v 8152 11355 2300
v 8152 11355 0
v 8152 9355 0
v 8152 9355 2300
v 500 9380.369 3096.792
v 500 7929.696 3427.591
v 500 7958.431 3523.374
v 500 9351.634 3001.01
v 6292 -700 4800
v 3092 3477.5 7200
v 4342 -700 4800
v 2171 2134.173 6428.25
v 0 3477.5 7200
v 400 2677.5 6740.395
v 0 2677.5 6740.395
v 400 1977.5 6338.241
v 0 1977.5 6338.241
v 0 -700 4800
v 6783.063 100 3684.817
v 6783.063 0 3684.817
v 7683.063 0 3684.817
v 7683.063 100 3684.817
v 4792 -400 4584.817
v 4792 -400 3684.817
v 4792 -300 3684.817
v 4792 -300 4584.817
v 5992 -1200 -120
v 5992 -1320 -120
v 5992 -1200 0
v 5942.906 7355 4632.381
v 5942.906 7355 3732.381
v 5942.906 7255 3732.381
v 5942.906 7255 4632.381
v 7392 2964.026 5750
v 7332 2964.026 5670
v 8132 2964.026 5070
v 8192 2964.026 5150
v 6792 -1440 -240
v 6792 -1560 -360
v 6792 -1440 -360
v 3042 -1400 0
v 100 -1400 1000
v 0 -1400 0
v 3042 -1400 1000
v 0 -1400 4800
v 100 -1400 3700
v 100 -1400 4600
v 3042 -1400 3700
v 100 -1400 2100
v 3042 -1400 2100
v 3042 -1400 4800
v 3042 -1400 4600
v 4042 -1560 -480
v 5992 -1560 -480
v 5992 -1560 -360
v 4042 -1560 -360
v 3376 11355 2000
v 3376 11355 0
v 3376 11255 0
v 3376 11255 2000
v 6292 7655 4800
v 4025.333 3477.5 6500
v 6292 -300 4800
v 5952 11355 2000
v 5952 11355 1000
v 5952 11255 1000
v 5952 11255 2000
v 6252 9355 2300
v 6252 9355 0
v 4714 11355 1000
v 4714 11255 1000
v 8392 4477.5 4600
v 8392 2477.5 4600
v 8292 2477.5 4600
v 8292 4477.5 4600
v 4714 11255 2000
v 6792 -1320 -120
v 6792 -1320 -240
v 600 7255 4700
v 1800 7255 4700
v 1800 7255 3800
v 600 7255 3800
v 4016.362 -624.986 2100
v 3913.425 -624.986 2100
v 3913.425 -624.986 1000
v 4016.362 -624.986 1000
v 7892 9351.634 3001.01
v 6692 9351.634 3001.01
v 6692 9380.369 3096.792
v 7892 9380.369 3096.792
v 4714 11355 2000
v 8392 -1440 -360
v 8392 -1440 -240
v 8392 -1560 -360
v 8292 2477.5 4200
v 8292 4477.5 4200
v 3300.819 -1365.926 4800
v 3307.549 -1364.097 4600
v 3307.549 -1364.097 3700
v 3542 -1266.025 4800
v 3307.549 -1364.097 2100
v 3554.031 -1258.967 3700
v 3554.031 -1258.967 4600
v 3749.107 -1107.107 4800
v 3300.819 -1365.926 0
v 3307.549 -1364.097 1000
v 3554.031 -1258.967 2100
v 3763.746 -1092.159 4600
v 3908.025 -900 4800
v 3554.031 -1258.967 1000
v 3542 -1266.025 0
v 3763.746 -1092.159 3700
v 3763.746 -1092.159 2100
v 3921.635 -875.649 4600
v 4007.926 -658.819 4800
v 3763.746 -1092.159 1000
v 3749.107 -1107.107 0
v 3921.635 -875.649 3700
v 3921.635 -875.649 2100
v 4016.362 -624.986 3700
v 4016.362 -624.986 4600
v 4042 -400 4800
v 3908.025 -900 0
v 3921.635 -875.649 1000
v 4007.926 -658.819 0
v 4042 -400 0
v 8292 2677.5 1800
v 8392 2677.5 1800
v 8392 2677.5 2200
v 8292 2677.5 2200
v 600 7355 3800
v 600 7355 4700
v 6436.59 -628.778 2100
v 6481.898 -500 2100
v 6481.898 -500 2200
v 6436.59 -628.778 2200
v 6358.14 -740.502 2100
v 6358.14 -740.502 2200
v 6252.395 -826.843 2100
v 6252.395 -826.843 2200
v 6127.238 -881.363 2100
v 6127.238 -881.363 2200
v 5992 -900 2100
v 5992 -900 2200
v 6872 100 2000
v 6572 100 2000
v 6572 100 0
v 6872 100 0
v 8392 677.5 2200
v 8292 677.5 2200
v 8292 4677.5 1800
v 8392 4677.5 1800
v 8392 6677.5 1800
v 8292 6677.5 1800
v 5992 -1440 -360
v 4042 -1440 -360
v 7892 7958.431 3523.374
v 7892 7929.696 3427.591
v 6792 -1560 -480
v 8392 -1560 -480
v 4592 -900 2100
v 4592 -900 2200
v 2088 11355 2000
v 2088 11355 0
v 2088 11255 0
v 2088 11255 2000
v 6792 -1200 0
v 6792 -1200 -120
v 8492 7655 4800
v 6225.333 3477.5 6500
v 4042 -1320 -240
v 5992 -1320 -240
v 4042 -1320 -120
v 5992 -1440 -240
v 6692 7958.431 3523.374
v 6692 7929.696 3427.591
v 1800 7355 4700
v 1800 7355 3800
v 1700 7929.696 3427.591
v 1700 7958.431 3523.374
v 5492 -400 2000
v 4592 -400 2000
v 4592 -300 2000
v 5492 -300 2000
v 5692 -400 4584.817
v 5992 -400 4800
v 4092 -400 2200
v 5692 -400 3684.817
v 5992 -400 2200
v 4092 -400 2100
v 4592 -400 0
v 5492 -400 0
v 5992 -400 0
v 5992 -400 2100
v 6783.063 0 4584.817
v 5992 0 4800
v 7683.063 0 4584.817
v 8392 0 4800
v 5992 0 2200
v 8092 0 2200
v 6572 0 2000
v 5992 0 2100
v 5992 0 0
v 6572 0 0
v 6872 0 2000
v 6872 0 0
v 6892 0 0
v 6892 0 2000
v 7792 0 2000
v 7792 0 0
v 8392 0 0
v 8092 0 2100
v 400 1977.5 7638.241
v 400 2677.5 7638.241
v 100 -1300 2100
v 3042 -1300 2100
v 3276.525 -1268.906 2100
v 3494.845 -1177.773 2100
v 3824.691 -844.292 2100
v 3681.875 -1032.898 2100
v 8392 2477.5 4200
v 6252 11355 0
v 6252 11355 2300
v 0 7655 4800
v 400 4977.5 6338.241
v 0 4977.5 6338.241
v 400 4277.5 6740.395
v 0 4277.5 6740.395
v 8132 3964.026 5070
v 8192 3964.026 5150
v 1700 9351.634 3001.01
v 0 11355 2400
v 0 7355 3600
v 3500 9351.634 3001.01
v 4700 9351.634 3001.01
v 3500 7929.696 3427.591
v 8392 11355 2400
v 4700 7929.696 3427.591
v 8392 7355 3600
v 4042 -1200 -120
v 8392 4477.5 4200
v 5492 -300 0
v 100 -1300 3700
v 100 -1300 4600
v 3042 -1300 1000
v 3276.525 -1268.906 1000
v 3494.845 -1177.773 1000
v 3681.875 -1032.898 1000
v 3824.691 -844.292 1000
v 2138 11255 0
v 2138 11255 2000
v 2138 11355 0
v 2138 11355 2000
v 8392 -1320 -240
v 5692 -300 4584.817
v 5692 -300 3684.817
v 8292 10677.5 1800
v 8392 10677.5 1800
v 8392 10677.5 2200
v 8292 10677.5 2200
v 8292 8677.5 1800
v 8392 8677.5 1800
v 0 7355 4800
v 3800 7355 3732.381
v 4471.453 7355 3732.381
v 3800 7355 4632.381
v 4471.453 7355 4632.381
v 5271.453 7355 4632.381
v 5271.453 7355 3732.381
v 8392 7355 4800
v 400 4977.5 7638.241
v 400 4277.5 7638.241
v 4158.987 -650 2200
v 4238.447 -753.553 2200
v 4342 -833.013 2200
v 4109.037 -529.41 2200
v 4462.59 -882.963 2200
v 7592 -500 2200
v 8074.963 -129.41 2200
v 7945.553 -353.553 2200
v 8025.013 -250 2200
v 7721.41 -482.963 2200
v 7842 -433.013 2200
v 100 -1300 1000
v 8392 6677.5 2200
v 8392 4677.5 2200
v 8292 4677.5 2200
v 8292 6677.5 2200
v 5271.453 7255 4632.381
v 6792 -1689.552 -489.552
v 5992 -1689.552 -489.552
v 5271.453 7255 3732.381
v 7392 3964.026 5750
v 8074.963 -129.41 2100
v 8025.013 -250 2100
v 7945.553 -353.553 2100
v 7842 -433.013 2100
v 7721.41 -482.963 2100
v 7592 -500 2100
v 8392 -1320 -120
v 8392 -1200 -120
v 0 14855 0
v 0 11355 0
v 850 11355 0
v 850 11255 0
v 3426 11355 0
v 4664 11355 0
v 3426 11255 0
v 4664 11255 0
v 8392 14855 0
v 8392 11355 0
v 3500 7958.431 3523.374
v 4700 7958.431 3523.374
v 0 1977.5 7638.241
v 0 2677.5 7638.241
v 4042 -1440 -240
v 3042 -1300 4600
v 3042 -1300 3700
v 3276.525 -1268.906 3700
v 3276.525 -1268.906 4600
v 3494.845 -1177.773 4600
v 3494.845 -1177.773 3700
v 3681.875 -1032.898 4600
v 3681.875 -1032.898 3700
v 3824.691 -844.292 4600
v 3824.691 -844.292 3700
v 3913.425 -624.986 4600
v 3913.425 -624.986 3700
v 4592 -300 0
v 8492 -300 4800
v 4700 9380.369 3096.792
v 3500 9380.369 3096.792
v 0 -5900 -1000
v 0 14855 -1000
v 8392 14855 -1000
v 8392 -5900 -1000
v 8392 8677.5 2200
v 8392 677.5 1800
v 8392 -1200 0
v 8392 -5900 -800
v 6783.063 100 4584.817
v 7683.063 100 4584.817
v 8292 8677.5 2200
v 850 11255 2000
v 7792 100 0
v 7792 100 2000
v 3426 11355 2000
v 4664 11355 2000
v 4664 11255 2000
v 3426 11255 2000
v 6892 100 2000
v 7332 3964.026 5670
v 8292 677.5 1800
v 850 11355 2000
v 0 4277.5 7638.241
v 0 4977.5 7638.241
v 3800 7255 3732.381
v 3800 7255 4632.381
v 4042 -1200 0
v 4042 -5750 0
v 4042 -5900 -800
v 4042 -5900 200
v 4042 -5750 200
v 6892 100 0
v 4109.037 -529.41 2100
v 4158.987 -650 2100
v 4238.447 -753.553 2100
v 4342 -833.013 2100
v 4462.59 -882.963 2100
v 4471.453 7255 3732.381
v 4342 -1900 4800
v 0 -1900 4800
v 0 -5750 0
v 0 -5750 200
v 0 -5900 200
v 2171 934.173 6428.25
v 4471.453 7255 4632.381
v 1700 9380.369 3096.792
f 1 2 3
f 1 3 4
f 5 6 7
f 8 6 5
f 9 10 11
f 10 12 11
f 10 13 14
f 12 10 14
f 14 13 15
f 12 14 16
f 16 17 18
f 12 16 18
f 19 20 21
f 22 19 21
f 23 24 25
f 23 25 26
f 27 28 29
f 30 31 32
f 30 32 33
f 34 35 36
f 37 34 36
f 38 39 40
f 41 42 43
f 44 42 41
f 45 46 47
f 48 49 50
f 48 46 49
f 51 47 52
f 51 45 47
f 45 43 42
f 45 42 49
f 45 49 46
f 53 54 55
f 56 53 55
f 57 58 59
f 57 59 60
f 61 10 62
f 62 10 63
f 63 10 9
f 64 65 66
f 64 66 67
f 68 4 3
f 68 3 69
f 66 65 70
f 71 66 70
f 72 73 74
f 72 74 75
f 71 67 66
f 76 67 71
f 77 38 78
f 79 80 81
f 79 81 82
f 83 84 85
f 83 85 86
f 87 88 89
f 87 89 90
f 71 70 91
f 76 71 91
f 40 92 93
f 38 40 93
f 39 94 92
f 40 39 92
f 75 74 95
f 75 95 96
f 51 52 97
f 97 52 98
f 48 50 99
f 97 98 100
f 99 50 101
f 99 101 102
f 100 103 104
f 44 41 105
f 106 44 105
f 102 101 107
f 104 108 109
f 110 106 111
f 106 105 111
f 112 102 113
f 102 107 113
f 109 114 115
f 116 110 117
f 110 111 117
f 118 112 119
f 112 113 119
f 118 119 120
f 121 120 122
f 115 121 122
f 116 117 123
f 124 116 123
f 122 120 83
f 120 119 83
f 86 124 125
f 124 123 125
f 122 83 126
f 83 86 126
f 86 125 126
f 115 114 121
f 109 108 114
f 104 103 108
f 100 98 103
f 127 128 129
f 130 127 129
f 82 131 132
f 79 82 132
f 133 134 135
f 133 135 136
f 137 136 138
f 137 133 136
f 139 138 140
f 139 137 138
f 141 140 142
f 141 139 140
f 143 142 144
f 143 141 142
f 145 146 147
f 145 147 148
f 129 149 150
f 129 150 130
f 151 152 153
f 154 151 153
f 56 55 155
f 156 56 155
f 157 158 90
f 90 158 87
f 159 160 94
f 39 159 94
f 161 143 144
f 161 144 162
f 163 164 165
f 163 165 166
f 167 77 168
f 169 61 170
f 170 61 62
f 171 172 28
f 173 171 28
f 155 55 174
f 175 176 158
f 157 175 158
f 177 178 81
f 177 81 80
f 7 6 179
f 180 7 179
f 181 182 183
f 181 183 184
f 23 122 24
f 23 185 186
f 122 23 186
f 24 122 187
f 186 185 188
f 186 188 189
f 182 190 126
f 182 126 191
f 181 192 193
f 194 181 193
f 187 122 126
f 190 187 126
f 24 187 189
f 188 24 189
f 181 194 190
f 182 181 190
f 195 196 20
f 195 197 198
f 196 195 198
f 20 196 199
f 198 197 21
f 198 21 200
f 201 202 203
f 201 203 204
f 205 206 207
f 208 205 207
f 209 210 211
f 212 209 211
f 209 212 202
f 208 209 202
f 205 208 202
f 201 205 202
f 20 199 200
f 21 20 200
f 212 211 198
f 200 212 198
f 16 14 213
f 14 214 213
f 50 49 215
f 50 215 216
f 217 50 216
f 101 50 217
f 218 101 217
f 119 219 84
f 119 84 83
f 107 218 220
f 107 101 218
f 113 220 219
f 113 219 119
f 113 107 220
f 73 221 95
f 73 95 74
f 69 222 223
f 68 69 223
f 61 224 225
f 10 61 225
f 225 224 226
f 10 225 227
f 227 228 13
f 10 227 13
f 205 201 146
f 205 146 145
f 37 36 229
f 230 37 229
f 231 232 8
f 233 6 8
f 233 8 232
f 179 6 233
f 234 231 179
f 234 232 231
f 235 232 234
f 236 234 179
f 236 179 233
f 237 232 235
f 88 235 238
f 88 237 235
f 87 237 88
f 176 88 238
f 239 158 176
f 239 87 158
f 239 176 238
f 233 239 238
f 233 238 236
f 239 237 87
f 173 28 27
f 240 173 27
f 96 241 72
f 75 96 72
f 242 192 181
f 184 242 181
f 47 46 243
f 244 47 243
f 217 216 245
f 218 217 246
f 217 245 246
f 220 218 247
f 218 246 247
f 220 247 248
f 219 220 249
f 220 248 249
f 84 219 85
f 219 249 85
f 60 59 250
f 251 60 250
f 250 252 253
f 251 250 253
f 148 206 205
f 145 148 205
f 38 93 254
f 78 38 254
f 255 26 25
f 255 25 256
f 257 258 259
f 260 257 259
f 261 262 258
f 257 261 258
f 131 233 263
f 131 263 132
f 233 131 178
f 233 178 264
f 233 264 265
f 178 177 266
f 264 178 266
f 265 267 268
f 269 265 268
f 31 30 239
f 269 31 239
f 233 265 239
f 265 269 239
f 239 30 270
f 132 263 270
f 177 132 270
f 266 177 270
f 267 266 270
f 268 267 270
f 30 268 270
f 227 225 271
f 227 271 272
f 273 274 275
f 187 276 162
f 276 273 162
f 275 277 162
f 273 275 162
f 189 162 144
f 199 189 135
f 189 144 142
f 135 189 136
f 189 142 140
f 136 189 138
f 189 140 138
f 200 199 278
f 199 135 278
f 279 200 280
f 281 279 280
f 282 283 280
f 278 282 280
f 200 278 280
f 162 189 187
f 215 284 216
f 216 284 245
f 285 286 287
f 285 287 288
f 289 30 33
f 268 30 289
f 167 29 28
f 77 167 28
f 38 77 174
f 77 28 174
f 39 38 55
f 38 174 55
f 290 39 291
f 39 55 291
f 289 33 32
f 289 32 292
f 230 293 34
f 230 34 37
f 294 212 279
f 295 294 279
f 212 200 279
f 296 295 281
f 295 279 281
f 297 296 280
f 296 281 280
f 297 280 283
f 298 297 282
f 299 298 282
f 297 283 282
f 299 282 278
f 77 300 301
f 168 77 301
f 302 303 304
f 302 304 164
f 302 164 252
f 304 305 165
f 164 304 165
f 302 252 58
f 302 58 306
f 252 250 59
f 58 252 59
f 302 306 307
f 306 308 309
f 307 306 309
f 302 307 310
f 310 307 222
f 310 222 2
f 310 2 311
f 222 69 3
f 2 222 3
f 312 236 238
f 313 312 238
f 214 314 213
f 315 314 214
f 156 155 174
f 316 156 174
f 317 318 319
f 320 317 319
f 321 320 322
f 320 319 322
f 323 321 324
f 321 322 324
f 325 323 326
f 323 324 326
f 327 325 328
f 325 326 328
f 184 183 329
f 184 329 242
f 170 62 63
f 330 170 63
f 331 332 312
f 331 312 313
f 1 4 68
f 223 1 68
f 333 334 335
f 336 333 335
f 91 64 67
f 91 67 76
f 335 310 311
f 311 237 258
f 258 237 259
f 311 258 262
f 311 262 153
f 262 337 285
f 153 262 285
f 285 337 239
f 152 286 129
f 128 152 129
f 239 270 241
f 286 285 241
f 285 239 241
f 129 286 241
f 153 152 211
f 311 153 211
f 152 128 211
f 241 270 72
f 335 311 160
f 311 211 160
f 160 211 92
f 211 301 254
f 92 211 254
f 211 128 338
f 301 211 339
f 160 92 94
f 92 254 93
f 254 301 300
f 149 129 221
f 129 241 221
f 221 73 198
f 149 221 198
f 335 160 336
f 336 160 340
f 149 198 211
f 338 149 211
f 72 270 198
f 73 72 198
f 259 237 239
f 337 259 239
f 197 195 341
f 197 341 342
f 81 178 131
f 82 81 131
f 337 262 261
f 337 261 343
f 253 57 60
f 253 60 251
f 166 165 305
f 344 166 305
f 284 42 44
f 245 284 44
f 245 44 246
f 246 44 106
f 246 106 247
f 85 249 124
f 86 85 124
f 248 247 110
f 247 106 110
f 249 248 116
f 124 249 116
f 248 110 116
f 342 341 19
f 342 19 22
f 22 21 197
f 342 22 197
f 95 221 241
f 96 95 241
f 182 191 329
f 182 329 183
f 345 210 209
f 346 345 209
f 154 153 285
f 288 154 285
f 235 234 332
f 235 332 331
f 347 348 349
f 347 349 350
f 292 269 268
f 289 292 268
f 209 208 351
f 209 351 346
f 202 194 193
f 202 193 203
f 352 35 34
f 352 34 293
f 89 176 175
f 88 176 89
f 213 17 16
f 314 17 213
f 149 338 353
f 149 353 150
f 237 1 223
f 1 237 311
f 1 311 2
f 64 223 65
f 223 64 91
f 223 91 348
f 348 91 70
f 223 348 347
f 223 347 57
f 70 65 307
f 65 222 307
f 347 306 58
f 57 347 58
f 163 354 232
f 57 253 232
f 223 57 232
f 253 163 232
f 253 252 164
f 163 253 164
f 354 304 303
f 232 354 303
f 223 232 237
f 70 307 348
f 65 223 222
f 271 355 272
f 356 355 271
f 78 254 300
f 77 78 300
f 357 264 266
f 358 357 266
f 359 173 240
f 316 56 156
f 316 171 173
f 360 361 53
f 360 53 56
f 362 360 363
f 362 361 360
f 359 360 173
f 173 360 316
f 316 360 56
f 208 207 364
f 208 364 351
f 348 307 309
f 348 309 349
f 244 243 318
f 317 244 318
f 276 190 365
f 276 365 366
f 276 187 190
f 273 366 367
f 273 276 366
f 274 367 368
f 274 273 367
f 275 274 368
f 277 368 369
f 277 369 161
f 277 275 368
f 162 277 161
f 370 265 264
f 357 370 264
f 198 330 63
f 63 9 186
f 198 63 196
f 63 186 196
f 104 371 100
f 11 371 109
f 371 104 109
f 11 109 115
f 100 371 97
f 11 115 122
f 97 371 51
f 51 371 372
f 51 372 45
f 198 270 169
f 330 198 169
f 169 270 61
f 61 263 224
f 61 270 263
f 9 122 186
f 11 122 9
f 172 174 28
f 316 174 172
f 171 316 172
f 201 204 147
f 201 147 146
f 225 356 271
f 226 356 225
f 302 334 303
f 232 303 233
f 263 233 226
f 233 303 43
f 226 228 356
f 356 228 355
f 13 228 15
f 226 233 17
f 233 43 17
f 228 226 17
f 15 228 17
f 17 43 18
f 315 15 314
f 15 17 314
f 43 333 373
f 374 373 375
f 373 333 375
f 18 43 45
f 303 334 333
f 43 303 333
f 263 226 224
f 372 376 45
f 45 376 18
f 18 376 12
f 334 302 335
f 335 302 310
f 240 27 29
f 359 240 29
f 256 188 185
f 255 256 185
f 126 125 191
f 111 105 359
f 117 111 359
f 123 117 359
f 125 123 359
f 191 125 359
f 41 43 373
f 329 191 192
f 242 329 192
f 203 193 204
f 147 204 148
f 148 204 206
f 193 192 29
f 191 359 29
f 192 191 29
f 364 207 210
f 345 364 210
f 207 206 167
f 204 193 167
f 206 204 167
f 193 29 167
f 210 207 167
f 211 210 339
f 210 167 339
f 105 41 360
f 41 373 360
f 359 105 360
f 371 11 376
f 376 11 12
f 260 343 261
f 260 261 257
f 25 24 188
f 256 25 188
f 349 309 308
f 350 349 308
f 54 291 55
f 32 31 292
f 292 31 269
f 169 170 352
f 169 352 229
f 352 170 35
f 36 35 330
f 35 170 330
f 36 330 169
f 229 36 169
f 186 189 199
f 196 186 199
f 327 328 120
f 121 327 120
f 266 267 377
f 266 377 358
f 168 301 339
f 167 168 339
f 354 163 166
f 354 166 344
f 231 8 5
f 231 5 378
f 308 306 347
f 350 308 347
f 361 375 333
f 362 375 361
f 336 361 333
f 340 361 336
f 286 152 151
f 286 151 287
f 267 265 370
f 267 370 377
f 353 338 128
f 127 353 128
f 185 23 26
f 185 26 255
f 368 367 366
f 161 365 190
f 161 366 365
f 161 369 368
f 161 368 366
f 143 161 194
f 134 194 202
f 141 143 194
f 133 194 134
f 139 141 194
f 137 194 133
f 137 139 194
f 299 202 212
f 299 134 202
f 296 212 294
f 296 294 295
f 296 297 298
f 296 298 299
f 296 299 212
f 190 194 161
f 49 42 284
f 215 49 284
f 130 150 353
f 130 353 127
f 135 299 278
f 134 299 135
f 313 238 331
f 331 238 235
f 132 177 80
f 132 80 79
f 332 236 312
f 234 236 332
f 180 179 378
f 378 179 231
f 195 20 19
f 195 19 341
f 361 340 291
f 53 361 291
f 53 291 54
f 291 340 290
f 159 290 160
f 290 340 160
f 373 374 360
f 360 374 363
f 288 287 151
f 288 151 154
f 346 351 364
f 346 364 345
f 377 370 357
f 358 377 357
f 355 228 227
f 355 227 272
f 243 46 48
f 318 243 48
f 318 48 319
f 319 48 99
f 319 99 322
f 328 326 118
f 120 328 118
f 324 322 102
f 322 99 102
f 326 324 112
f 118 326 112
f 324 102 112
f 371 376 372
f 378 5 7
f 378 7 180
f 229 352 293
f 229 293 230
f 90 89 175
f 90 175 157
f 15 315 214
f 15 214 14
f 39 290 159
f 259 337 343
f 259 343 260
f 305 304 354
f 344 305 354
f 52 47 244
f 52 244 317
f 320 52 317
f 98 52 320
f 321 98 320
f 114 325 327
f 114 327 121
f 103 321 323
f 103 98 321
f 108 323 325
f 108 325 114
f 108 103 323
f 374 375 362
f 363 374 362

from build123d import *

# Parameters (mm, degrees)
F1_DEPTH  = 4800
F2_W      = 8392
F2_H      = 4000
F3_DEPTH  = 2400
F5_DEPTH  = 8392
F7_DEPTH  = 5992
F8_DEPTH  = 300
F11_DEPTH = 12755.001
F14_DEPTH = 500
F16_DEPTH = 8392.001
F18_DEPTH = 100
F20_DEPTH = 12755.001
F21_W     = 2000
F21_H     = 400
F22_DEPTH = 100
F23_W     = 900
F23_H     = 900
F23_H_2   = 2000
F23_W_2   = 300
F24_DEPTH = 100
F25_W     = 900
F25_H     = 2000
F25_H_2   = 900
F26_DEPTH = 100
F29_DEPTH = 1100
F32_DEPTH = 900
F34_DEPTH = 100
F36_DEPTH = 400
F37_R     = 499.99999
F38_W     = 1900
F38_H     = 2300
F39_DEPTH = 2000
F40_W     = 1238
F40_H     = 2000
F40_H_2   = 1000
F41_DEPTH = 100
F42_W     = 1200
F42_H     = 1484.5474734546
F43_DEPTH = 100
F44_W     = 1000
F44_H     = 1000
F45_DEPTH = 100
F46_W     = 671.4527505016
F46_H     = 900
F46_W_2   = 1200
F47_DEPTH = 100
F48_W     = 8392
F48_H     = 20755
F49_DEPTH = 1000
F51_DEPTH = 4350
F52_W     = 4042
F52_H     = 200
F53_DEPTH = 150
F55_DEPTH = 800


# Not quite as in the source:
# - a fillet or chamfer is up to 0.001 mm smaller than in the source, because OpenCascade refuses the exact size


with BuildPart() as f1:
    # F0 (on Top) → F1 (new body)
    with BuildSketch(Plane.XY):
        with BuildLine():
            Line((0, 11355), (0, -1400))
            Line((0, -1400), (3042, -1400))
            ThreePointArc((3042, -1400), (3749.1067811865, -1107.1067811865), (4042, -400))
            Line((4042, -400), (5992, -400))
            Line((5992, -400), (5992, 0))
            Line((5992, 0), (8392, 0))
            Line((8392, 0), (8392, 11355))
            Line((8392, 11355), (0, 11355))
        make_face()
    extrude(amount=F1_DEPTH)

    # F2 (on face) → F3 (cut)
    with BuildSketch(Plane.XY.offset(4800)):
        with Locations((4196, 9355)):
            Rectangle(F2_W, F2_H)
    extrude(amount=-F3_DEPTH, mode=Mode.SUBTRACT)

    # F4 (on face) → F5 (join, through all)
    with BuildSketch(Plane.YZ.offset(8392)):
        Polygon((7355, 2400), (11355, 2400), (7355, 3600), align=None)
    extrude(amount=-F5_DEPTH)

    # F6 (on face) → F7 (join, through all)
    with BuildSketch(Plane.YZ.offset(5992)):
        Polygon((3477.5, 7200), (-700, 4800), (-400, 4800), (0, 4800), (7655, 4800), align=None)
    extrude(amount=-F7_DEPTH)

    # F6 (on face) → F8 (join)
    with BuildSketch(Plane.YZ.offset(5992)):
        Polygon((3477.5, 7200), (-700, 4800), (7655, 4800), align=None)
    extrude(amount=F8_DEPTH)

    # F10 (on face) → F11 (cut, through all)
    with BuildSketch(Plane.XZ.offset(1400)):
        Polygon((2292, 7800), (6292, 4800), (6292, 7800), align=None)
    extrude(amount=-F11_DEPTH, mode=Mode.SUBTRACT)

    # F12 (on face) → F13 (join, up to the next surface of F1)
    with BuildSketch(Plane.XZ.offset(1400)):
        Polygon((2171, 6428.25), (0, 4800), (3042, 4800), (4342, 4800), align=None)
    extrude(until=Until.NEXT, dir=(0, 1, 0))

    # F12 (on face) → F14 (join)
    with BuildSketch(Plane.XZ.offset(1400)):
        Polygon((2171, 6428.25), (0, 4800), (4342, 4800), align=None)
    extrude(amount=F14_DEPTH)

    # F15 (on face) → F16 (cut, through all)
    with BuildSketch(Plane(origin=(0, 0, 0), x_dir=(0, -1, 0), z_dir=(-1, 0, 0))):
        Polygon((-934.17265625, 6428.25), (1900, 4800), (1900, 6428.25), align=None)
    extrude(amount=-F16_DEPTH, mode=Mode.SUBTRACT)

    # F9 (on face) → F17 (join, up to the next surface of F1)
    with BuildSketch(Plane.YZ.offset(8392)):
        Polygon((3477.5, 6500), (-300, 4800), (0, 4800), (7355, 4800), (7655, 4800), align=None)
    extrude(until=Until.NEXT, dir=(-1, 0, 0))

    # F9 (on face) → F18 (join)
    with BuildSketch(Plane.YZ.offset(8392)):
        Polygon((3477.5, 6500), (-300, 4800), (7655, 4800), align=None)
    extrude(amount=F18_DEPTH)

    # F19 (on face) → F20 (cut, through all)
    with BuildSketch(Plane.XZ.offset(1400)):
        Polygon((6225.3333333333, 6500), (8492, 4800), (8492, 6500), align=None)
    extrude(amount=-F20_DEPTH, mode=Mode.SUBTRACT)

    # F21 (on face) → F22 (cut)
    with BuildSketch(Plane.YZ.offset(8392)):
        with Locations((5677.5, 2000)):
            Rectangle(F21_W, F21_H)
        with Locations((1677.5, 2000)):
            Rectangle(F21_W, F21_H)
        with Locations((3477.5, 4400)):
            Rectangle(F21_W, F21_H)
        with Locations((9677.5, 2000)):
            Rectangle(F21_W, F21_H)
    extrude(amount=-F22_DEPTH, mode=Mode.SUBTRACT)

    # F23 (on face) → F24 (cut)
    with BuildSketch(Plane.XZ):
        with Locations((7233.0629348755, 4134.8165988922)):
            Rectangle(F23_W, F23_H)
        with Locations((7342, 1000)):
            Rectangle(F23_W, F23_H_2)
        with Locations((6722, 1000)):
            Rectangle(F23_W_2, F23_H_2)
    extrude(amount=-F24_DEPTH, mode=Mode.SUBTRACT)

    # F25 (on face) → F26 (cut)
    with BuildSketch(Plane.XZ.offset(400)):
        with Locations((5042, 1000)):
            Rectangle(F25_W, F25_H)
        with Locations((5242, 4134.8165988922)):
            Rectangle(F25_W, F25_H_2)
    extrude(amount=-F26_DEPTH, mode=Mode.SUBTRACT)

    # F28 (on offset) → F29 (cut)
    with BuildSketch(Plane(origin=(0, 0, 1000), x_dir=(1, 0, 0), z_dir=(0, 0, -1))):
        with BuildLine():
            Line((3042, 1400), (100, 1400))
            Line((100, 1400), (100, 1300))
            Line((100, 1300), (3042, 1300))
            ThreePointArc((3042, 1300), (3593.1410747417, 1111.5079168446), (3913.4249732822, 624.9855905167))
            Line((3913.4249732822, 624.9855905167), (4016.3620908368, 624.9855905167))
            ThreePointArc((4016.3620908368, 624.9855905167), (3664.5007668603, 1182.6191891708), (3042, 1400))
        make_face()
    extrude(amount=-F29_DEPTH, mode=Mode.SUBTRACT)

    # F31 (on offset) → F32 (cut)
    with BuildSketch(Plane(origin=(0, 0, 3700), x_dir=(1, 0, 0), z_dir=(0, 0, -1))):
        with BuildLine():
            Line((100, 1400), (100, 1300))
            Line((100, 1300), (3042, 1300))
            ThreePointArc((3042, 1300), (3593.1410747417, 1111.5079168446), (3913.4249732822, 624.9855905167))
            Line((3913.4249732822, 624.9855905167), (4016.3620908368, 624.9855905167))
            ThreePointArc((4016.3620908368, 624.9855905167), (3664.5007668603, 1182.6191891708), (3042, 1400))
            Line((3042, 1400), (100, 1400))
        make_face()
    extrude(amount=-F32_DEPTH, mode=Mode.SUBTRACT)

    # F33 (on face) → F34 (join)
    with BuildSketch(Plane(origin=(0, 0, 2100), x_dir=(1, 0, 0), z_dir=(0, 0, -1))):
        with BuildLine():
            Line((8092, 0), (8092, 500))
            Line((8092, 500), (6481.8979485566, 500))
            ThreePointArc((6481.8979485566, 500), (6308.2277660168, 787.2983346207), (5992, 900))
            Line((5992, 900), (4092, 900))
            Line((4092, 900), (4092, 400))
            Line((4092, 400), (5992, 400))
            Line((5992, 400), (5992, 0))
            Line((5992, 0), (8092, 0))
        make_face()
    extrude(amount=-F34_DEPTH)

    # F35 (on face) → F36 (join)
    with BuildSketch(Plane(origin=(0, 0, 0), x_dir=(0, -1, 0), z_dir=(-1, 0, 0))):
        Polygon((-2677.5, 6740.39497307), (-1977.5, 6338.2405745063), (-1977.5, 7638.2405745063), (-2677.5, 7638.2405745063), align=None)
        Polygon((-4977.5, 6338.2405745063), (-4277.5, 6740.39497307), (-4277.5, 7638.2405745063), (-4977.5, 7638.2405745063), align=None)
    extrude(amount=-F36_DEPTH)

    # F37 (radius 500 in the source; OpenCascade refuses exactly that, so slightly less here)
    f37_edges = [f1.edges().sort_by_distance(p)[0] for p in [
        (8092, -500, 2150),
        (4092, -900, 2150),
    ]]
    fillet(f37_edges, radius=F37_R)

    # F38 (on face) → F39 (cut)
    with BuildSketch(Plane(origin=(0, 11355, 0), x_dir=(-1, 0, 0), z_dir=(0, 1, 0))):
        with Locations((-7202, 1150)):
            Rectangle(F38_W, F38_H)
    extrude(amount=-F39_DEPTH, mode=Mode.SUBTRACT)

    # F40 (on face) → F41 (cut)
    with BuildSketch(Plane(origin=(0, 11355, 0), x_dir=(-1, 0, 0), z_dir=(0, 1, 0))):
        with Locations((-1469, 1000)):
            Rectangle(F40_W, F40_H)
        with Locations((-2757, 1000)):
            Rectangle(F40_W, F40_H)
        with Locations((-4045, 1000)):
            Rectangle(F40_W, F40_H)
        with Locations((-5333, 1500)):
            Rectangle(F40_W, F40_H_2)
    extrude(amount=-F41_DEPTH, mode=Mode.SUBTRACT)

    # F42 (on face) → F43 (join)
    with BuildSketch(Plane(origin=(0, 1598.119266055, 5327.0642201835), x_dir=(1, 0, 0), z_dir=(0, 0.2873478856, 0.9578262852))):
        with Locations((7292, 7352.63367649)):
            Rectangle(F42_W, F42_H)
        with Locations((1100, 7352.63367649)):
            Rectangle(F42_W, F42_H)
        with Locations((4100, 7352.63367649)):
            Rectangle(F42_W, F42_H)
    extrude(amount=F43_DEPTH)

    # F44 (on face) → F45 (join)
    with BuildSketch(Plane(origin=(5361.12, 0, 7148.16), x_dir=(0.8, 0, -0.6), z_dir=(0.6, 0, 0.8))):
        with Locations((2963.6, 3464.0258550644)):
            Rectangle(F44_W, F44_H)
    extrude(amount=F45_DEPTH)

    # F46 (on face) → F47 (cut)
    with BuildSketch(Plane(origin=(0, 7355, 0), x_dir=(-1, 0, 0), z_dir=(0, 1, 0))):
        with Locations((-5607.1791257524, 4182.3805087188)):
            Rectangle(F46_W, F46_H)
        with Locations((-4135.7263752508, 4182.3805087188)):
            Rectangle(F46_W, F46_H)
        with Locations((-1200, 4250)):
            Rectangle(F46_W_2, F46_H)
    extrude(amount=-F47_DEPTH, mode=Mode.SUBTRACT)

    # F48 (on face) → F49 (join)
    with BuildSketch(Plane(origin=(0, 0, 0), x_dir=(1, 0, 0), z_dir=(0, 0, -1))):
        with Locations((4196, -4477.5)):
            Rectangle(F48_W, F48_H)
    extrude(amount=F49_DEPTH)

    # F50 (on face) → F51 (cut, through all)
    with BuildSketch(Plane.YZ.offset(8392)):
        Polygon((-1200, -120), (-1200, 0), (-5900, 0), (-5900, -800), (-1560, -480), (-1560, -360), (-1440, -360), (-1440, -240), (-1320, -240), (-1320, -120), align=None)
    extrude(amount=-F51_DEPTH, mode=Mode.SUBTRACT)

    # F52 (on face) → F53 (join)
    with BuildSketch(Plane.XZ.offset(5900)):
        with Locations((2021, 100)):
            Rectangle(F52_W, F52_H)
    extrude(amount=-F53_DEPTH)

    # F54 (on face) → F55 (join)
    with BuildSketch(Plane.YZ.offset(5992)):
        Polygon((-1200, -489.552238806), (-1200, 0), (-1689.552238806, -489.552238806), align=None)
    extrude(amount=F55_DEPTH)


solid = f1.part
